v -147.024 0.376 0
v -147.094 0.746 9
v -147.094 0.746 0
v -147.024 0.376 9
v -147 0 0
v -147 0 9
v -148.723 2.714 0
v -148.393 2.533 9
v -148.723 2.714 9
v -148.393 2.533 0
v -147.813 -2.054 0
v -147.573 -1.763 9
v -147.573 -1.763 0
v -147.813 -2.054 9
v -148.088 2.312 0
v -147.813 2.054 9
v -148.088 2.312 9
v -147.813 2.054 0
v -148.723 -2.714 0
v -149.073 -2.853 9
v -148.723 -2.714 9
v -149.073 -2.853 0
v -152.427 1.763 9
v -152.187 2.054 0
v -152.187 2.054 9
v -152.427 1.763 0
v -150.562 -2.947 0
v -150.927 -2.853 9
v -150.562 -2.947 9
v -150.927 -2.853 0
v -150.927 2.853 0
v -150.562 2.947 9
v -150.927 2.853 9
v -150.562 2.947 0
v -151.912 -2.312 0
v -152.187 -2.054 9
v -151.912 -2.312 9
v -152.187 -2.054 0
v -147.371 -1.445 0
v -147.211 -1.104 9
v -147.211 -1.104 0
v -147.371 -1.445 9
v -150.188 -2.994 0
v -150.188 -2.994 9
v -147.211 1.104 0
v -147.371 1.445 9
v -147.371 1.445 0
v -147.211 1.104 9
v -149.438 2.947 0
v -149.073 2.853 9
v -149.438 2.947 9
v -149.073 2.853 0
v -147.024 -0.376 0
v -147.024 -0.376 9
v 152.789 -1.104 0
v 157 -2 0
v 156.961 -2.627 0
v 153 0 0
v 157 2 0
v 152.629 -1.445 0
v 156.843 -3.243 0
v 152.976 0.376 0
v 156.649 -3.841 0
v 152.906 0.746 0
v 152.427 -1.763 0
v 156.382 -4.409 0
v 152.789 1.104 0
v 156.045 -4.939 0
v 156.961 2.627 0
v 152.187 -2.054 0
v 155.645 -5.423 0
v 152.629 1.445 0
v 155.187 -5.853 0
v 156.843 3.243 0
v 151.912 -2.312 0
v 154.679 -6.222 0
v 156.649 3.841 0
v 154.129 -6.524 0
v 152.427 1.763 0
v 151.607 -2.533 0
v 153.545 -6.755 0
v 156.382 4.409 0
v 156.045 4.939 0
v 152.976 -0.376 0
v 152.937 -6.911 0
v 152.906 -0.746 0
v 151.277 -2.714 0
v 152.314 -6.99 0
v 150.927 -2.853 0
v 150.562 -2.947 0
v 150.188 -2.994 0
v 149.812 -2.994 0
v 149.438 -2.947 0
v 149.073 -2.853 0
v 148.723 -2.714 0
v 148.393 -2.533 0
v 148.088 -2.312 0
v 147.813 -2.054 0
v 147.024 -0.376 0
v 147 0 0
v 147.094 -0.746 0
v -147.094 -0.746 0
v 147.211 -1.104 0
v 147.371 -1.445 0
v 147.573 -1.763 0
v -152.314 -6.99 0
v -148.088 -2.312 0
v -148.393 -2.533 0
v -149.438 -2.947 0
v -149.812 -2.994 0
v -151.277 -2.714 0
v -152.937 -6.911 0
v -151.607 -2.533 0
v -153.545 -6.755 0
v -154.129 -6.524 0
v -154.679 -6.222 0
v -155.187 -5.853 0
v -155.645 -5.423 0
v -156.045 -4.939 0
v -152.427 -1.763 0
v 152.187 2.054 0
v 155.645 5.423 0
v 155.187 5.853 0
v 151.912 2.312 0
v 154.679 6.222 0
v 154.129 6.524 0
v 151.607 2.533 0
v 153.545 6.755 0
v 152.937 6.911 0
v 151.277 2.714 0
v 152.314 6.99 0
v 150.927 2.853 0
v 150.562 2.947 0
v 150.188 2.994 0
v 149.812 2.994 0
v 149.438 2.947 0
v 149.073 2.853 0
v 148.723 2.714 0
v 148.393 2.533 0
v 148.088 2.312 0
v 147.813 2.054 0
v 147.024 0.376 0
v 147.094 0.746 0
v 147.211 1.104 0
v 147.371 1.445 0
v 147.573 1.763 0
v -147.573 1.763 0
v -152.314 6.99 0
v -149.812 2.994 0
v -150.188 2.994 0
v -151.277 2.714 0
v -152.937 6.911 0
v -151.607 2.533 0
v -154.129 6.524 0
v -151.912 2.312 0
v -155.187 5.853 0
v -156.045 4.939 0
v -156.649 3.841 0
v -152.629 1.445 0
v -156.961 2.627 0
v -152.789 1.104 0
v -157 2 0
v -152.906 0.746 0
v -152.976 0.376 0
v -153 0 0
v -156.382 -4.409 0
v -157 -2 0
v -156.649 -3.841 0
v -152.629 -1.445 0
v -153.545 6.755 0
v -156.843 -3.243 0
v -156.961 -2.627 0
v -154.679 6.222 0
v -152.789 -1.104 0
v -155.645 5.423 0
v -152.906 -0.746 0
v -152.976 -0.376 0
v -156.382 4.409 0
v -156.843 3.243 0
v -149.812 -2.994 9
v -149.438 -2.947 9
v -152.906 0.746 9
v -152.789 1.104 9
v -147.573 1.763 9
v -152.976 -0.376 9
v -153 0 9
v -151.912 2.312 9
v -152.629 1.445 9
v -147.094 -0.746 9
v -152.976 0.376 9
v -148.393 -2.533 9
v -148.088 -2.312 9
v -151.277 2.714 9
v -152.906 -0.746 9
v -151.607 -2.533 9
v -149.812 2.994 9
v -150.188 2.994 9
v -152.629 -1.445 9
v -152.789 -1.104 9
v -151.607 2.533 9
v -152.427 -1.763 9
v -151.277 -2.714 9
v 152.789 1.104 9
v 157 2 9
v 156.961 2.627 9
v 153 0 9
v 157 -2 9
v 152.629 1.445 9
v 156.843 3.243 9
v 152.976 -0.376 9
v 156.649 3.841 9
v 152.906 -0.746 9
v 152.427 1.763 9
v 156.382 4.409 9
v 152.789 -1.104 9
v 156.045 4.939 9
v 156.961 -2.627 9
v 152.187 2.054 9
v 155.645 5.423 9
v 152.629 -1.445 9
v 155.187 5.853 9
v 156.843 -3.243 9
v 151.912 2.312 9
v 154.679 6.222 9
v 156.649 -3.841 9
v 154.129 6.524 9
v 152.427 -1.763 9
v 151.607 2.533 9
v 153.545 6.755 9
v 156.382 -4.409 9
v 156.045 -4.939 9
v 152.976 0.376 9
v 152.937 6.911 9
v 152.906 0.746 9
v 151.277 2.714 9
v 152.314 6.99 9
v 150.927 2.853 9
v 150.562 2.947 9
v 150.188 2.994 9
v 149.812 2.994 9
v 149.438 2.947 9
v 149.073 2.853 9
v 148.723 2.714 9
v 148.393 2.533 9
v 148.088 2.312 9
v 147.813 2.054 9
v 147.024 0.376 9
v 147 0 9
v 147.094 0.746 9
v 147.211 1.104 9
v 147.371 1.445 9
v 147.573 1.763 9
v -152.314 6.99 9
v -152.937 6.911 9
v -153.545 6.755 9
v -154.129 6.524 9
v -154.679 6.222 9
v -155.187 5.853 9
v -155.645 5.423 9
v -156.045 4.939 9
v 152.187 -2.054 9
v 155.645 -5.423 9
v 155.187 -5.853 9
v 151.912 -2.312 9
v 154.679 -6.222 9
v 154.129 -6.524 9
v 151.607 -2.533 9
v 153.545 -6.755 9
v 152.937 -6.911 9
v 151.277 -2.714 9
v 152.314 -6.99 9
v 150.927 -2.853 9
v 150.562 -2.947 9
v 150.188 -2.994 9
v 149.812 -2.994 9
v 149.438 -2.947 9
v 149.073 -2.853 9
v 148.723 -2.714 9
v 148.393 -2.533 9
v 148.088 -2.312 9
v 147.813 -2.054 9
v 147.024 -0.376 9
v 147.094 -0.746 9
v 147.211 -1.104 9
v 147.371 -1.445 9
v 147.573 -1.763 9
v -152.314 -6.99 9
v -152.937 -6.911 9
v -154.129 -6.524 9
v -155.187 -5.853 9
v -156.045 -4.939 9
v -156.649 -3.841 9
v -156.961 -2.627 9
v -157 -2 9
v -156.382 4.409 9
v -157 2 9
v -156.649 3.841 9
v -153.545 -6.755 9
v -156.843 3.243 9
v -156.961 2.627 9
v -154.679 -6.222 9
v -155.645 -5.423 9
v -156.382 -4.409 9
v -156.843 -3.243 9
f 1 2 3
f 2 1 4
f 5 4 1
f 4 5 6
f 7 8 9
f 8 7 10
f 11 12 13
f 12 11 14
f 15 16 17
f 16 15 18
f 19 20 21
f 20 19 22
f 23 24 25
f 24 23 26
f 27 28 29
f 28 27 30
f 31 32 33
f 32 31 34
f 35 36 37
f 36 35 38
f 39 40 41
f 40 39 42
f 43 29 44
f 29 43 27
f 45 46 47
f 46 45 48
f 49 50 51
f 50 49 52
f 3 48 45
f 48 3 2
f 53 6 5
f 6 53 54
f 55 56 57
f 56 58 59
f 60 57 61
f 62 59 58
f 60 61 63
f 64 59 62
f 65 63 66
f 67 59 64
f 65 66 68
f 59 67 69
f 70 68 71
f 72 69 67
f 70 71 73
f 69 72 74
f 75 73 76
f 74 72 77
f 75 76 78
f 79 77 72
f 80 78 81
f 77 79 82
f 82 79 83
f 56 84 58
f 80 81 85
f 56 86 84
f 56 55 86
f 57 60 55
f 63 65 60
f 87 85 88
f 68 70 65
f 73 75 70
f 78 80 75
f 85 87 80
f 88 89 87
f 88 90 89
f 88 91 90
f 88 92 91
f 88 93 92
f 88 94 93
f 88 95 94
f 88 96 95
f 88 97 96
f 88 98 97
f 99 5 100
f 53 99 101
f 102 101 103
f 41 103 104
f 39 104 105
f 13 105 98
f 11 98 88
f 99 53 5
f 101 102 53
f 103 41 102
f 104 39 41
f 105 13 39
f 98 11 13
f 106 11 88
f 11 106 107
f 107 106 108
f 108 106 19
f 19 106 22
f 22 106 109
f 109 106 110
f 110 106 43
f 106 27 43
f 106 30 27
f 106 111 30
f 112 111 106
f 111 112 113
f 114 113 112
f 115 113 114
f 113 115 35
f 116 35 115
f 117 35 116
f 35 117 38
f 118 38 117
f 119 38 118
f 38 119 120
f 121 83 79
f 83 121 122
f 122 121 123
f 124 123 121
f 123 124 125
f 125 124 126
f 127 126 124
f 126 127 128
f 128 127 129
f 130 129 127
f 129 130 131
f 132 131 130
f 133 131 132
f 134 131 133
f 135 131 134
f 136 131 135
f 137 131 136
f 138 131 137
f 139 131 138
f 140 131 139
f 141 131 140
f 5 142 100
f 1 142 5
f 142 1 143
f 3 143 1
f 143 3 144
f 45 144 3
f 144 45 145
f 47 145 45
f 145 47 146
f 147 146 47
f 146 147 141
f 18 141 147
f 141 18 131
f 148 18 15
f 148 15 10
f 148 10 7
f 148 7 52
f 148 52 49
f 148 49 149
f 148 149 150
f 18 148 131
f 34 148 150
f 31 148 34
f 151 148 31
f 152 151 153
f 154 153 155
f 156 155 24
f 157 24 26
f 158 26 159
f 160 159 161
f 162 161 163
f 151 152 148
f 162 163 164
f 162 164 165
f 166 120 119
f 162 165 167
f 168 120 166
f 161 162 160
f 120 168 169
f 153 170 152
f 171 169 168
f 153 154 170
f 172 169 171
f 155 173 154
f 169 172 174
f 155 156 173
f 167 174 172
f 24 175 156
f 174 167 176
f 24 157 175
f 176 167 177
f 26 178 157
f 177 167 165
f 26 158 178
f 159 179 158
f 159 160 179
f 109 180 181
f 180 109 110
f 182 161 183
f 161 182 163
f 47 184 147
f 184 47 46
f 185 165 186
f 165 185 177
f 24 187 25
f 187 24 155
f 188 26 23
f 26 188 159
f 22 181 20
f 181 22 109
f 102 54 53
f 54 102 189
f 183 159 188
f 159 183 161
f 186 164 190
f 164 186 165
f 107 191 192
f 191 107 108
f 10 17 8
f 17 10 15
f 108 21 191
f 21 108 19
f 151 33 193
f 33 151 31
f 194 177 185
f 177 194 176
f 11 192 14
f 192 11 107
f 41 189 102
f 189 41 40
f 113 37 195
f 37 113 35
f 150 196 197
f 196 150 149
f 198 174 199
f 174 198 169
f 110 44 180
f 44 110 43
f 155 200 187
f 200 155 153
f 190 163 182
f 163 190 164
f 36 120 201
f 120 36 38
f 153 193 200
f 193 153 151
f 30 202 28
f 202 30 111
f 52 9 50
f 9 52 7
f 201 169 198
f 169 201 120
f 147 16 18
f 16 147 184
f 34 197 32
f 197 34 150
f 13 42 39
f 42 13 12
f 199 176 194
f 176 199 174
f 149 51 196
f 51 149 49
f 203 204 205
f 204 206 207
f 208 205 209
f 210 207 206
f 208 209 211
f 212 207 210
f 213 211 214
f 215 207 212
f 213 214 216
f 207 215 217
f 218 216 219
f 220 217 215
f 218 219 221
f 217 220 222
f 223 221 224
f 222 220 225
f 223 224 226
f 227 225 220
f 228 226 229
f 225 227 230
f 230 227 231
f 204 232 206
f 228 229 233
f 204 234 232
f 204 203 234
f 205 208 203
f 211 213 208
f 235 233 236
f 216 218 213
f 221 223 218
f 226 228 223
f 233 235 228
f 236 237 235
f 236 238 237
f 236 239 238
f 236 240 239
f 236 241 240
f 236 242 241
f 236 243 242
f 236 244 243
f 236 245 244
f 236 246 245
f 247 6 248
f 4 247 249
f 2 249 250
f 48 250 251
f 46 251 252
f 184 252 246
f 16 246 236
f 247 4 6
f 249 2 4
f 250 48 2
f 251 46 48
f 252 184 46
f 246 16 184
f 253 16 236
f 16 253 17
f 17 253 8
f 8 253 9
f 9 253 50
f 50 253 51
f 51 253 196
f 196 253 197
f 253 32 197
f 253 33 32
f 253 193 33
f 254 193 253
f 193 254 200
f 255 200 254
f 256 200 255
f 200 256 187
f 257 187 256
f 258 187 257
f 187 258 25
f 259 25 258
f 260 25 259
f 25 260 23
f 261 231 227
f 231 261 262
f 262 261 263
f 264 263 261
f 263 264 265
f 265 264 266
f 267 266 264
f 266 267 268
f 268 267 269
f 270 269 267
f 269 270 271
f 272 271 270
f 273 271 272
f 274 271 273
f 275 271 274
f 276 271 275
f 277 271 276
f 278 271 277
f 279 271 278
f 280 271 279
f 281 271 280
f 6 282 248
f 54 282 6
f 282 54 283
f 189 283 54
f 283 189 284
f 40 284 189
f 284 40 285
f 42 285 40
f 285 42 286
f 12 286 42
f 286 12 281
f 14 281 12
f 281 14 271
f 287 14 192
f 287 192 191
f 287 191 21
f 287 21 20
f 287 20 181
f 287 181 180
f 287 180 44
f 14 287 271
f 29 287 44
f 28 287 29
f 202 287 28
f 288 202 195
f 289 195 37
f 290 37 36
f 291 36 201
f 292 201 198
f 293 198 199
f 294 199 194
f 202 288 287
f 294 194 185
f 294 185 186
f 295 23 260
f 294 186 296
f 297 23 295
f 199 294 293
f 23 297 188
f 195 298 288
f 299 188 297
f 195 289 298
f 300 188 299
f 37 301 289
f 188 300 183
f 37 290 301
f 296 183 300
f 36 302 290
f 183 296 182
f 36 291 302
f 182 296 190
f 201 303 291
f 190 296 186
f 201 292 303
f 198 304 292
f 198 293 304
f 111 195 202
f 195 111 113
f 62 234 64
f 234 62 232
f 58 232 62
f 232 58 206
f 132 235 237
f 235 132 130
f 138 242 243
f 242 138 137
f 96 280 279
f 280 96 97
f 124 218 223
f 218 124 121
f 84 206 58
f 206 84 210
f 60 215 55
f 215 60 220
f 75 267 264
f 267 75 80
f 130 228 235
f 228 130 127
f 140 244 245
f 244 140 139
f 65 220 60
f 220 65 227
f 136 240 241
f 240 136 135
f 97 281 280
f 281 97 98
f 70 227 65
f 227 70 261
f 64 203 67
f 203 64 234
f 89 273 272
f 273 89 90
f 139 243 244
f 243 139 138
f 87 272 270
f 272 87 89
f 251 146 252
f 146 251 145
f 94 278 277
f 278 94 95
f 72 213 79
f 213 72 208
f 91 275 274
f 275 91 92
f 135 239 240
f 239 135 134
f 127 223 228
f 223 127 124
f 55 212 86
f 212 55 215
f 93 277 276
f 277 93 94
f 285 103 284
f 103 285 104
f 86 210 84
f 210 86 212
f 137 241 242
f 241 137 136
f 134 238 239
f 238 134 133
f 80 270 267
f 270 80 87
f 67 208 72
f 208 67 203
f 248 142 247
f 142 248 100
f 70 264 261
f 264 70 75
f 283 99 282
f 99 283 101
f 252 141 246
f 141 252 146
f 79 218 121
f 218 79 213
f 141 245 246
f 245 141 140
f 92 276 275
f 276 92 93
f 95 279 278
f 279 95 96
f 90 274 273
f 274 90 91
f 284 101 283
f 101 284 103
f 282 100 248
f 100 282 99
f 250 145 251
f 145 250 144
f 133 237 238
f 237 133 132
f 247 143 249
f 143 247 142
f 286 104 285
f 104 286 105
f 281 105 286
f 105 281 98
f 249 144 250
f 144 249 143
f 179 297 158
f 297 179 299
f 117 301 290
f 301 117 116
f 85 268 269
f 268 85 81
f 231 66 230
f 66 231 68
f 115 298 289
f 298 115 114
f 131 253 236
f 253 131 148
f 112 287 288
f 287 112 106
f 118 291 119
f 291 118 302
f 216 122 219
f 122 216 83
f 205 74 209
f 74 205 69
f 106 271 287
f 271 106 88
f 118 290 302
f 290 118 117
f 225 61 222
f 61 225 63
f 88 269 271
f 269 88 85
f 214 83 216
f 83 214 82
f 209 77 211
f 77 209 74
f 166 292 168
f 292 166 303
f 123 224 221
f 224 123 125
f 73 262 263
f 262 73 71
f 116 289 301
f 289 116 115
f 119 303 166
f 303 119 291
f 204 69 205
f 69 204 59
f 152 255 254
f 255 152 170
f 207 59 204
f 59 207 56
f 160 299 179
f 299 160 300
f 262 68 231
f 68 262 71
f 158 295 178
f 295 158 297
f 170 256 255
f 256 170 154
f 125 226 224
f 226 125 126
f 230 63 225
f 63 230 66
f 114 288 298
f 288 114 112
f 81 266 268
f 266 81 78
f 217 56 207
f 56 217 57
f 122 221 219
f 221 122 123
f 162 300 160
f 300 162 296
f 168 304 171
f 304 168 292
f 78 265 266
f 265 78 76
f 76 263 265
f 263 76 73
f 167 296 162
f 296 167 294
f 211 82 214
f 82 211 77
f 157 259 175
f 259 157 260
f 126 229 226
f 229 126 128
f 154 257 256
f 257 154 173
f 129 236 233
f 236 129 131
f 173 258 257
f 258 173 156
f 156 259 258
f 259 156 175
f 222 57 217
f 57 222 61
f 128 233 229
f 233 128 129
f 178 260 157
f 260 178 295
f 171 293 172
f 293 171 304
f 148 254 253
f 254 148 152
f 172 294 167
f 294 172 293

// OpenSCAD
$fn = 50;


difference() {
	union() {
		hull() {
			translate(v = [-152.0000000000, 2.0000000000, 0]) {
				cylinder(h = 9, r = 5);
			}
			translate(v = [152.0000000000, 2.0000000000, 0]) {
				cylinder(h = 9, r = 5);
			}
			translate(v = [-152.0000000000, -2.0000000000, 0]) {
				cylinder(h = 9, r = 5);
			}
			translate(v = [152.0000000000, -2.0000000000, 0]) {
				cylinder(h = 9, r = 5);
			}
		}
	}
	union() {
		translate(v = [-150.0000000000, 0.0000000000, 0]) {
			cylinder(h = 9, r = 3.0000000000);
		}
		translate(v = [150.0000000000, 0.0000000000, 0]) {
			cylinder(h = 9, r = 3.0000000000);
		}
		translate(v = [-150.0000000000, 0.0000000000, 0]) {
			cylinder(h = 9, r = 1.5000000000);
		}
		translate(v = [150.0000000000, 0.0000000000, 0]) {
			cylinder(h = 9, r = 1.5000000000);
		}
		translate(v = [-150.0000000000, 0.0000000000, 0]) {
			cylinder(h = 9, r = 1.5000000000);
		}
		translate(v = [150.0000000000, 0.0000000000, 0]) {
			cylinder(h = 9, r = 1.5000000000);
		}
		translate(v = [-150.0000000000, 0.0000000000, 0]) {
			cylinder(h = 9, r = 1.5000000000);
		}
		translate(v = [150.0000000000, 0.0000000000, 0]) {
			cylinder(h = 9, r = 1.5000000000);
		}
	}
}
